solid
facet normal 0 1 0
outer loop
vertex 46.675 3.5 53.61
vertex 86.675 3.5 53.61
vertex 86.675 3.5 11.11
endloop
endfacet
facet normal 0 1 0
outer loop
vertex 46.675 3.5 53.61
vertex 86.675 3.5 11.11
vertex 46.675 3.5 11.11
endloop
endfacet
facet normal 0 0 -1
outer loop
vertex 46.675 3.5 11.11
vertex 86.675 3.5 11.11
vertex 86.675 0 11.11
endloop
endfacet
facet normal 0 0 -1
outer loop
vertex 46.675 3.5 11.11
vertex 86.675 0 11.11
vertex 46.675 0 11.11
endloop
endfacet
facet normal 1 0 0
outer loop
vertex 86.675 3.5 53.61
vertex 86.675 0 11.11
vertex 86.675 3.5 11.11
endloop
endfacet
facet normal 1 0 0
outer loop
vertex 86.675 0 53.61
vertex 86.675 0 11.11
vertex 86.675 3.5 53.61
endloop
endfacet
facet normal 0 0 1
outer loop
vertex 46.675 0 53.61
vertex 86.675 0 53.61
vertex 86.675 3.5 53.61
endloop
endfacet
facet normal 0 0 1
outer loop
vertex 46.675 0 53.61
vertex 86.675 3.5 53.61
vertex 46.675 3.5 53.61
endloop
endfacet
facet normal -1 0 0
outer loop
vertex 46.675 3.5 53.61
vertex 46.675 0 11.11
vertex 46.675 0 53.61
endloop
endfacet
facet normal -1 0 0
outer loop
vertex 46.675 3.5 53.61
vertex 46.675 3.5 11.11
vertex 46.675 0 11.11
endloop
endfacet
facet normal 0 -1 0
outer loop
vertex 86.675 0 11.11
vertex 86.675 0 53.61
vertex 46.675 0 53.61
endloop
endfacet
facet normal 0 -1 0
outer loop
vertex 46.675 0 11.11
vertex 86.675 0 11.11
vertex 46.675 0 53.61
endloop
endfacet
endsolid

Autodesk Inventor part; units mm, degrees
ref_plane "YZ Plane" through (0, 0, 0) normal (1, 0, 0) x (0, 1, 0)
sketch "Sketch1" plane through (0, 0, 0) normal (0, 1, 0) x (-1, 0, 0)
  line L0 (61.5114, -24.7991) -> (-86.6751, -24.7991)
  line L1 (-86.6751, -24.7991) -> (-86.6751, 53.6097)
  line L2 (-86.6751, 53.6097) -> (61.5114, 53.6097)
  line L3 (61.5114, 53.6097) -> (61.5114, -24.7991)
  point P0 (0, 0)
extrude "Extrusion1" add sketch "Sketch1" along normal blind 3.5
sketch "Sketch2" plane through (-61.5114, 0, -24.7991) normal (-1, 0, 0) x (0, 0, 1)
  line L0 (0, 0) -> (78.4088, 0) projected
  line L1 (78.4088, 0) -> (78.4088, 3.5) projected
  line L2 (0, 3.5) -> (78.4088, 3.5) projected
  line L3 (0, 0) -> (0, 3.5) projected
  point P0 (24.7991, 0)
ref_plane "Work Plane1" through (46.6751, -27, 13.6097) normal (-1, 0, 0) x (0, 0, 1)
extrude "Extrusion2" cut sketch "Sketch2" against normal up to surface (108.1865 mm away)
sketch "Sketch3" plane through (86.6751, 0, -24.7991) normal (0, 0, -1) x (-1, 0, 0)
  line L0 (40, 0) -> (40, 3.5) projected
  line L1 (0, 3.5) -> (40, 3.5) projected
  line L2 (0, 0) -> (0, 3.5) projected
  line L3 (0, 0) -> (40, 0) projected
  point P0 (86.6751, 0)
ref_plane "Work Plane2" through (49.1751, -3, 11.1097) normal (0, 0, -1) x (0, 1, 0)
extrude "Extrusion3" cut sketch "Sketch3" against normal up to surface (35.9088 mm away)
sketch "Sketch4" plane through (0, 3.5, 0) normal (0, 1, 0) x (1, 0, 0)
  line L0 (46.6751, -53.6097) -> (86.6751, -53.6097) projected
  point P0 (0, 0)
properties part number "BASE"
